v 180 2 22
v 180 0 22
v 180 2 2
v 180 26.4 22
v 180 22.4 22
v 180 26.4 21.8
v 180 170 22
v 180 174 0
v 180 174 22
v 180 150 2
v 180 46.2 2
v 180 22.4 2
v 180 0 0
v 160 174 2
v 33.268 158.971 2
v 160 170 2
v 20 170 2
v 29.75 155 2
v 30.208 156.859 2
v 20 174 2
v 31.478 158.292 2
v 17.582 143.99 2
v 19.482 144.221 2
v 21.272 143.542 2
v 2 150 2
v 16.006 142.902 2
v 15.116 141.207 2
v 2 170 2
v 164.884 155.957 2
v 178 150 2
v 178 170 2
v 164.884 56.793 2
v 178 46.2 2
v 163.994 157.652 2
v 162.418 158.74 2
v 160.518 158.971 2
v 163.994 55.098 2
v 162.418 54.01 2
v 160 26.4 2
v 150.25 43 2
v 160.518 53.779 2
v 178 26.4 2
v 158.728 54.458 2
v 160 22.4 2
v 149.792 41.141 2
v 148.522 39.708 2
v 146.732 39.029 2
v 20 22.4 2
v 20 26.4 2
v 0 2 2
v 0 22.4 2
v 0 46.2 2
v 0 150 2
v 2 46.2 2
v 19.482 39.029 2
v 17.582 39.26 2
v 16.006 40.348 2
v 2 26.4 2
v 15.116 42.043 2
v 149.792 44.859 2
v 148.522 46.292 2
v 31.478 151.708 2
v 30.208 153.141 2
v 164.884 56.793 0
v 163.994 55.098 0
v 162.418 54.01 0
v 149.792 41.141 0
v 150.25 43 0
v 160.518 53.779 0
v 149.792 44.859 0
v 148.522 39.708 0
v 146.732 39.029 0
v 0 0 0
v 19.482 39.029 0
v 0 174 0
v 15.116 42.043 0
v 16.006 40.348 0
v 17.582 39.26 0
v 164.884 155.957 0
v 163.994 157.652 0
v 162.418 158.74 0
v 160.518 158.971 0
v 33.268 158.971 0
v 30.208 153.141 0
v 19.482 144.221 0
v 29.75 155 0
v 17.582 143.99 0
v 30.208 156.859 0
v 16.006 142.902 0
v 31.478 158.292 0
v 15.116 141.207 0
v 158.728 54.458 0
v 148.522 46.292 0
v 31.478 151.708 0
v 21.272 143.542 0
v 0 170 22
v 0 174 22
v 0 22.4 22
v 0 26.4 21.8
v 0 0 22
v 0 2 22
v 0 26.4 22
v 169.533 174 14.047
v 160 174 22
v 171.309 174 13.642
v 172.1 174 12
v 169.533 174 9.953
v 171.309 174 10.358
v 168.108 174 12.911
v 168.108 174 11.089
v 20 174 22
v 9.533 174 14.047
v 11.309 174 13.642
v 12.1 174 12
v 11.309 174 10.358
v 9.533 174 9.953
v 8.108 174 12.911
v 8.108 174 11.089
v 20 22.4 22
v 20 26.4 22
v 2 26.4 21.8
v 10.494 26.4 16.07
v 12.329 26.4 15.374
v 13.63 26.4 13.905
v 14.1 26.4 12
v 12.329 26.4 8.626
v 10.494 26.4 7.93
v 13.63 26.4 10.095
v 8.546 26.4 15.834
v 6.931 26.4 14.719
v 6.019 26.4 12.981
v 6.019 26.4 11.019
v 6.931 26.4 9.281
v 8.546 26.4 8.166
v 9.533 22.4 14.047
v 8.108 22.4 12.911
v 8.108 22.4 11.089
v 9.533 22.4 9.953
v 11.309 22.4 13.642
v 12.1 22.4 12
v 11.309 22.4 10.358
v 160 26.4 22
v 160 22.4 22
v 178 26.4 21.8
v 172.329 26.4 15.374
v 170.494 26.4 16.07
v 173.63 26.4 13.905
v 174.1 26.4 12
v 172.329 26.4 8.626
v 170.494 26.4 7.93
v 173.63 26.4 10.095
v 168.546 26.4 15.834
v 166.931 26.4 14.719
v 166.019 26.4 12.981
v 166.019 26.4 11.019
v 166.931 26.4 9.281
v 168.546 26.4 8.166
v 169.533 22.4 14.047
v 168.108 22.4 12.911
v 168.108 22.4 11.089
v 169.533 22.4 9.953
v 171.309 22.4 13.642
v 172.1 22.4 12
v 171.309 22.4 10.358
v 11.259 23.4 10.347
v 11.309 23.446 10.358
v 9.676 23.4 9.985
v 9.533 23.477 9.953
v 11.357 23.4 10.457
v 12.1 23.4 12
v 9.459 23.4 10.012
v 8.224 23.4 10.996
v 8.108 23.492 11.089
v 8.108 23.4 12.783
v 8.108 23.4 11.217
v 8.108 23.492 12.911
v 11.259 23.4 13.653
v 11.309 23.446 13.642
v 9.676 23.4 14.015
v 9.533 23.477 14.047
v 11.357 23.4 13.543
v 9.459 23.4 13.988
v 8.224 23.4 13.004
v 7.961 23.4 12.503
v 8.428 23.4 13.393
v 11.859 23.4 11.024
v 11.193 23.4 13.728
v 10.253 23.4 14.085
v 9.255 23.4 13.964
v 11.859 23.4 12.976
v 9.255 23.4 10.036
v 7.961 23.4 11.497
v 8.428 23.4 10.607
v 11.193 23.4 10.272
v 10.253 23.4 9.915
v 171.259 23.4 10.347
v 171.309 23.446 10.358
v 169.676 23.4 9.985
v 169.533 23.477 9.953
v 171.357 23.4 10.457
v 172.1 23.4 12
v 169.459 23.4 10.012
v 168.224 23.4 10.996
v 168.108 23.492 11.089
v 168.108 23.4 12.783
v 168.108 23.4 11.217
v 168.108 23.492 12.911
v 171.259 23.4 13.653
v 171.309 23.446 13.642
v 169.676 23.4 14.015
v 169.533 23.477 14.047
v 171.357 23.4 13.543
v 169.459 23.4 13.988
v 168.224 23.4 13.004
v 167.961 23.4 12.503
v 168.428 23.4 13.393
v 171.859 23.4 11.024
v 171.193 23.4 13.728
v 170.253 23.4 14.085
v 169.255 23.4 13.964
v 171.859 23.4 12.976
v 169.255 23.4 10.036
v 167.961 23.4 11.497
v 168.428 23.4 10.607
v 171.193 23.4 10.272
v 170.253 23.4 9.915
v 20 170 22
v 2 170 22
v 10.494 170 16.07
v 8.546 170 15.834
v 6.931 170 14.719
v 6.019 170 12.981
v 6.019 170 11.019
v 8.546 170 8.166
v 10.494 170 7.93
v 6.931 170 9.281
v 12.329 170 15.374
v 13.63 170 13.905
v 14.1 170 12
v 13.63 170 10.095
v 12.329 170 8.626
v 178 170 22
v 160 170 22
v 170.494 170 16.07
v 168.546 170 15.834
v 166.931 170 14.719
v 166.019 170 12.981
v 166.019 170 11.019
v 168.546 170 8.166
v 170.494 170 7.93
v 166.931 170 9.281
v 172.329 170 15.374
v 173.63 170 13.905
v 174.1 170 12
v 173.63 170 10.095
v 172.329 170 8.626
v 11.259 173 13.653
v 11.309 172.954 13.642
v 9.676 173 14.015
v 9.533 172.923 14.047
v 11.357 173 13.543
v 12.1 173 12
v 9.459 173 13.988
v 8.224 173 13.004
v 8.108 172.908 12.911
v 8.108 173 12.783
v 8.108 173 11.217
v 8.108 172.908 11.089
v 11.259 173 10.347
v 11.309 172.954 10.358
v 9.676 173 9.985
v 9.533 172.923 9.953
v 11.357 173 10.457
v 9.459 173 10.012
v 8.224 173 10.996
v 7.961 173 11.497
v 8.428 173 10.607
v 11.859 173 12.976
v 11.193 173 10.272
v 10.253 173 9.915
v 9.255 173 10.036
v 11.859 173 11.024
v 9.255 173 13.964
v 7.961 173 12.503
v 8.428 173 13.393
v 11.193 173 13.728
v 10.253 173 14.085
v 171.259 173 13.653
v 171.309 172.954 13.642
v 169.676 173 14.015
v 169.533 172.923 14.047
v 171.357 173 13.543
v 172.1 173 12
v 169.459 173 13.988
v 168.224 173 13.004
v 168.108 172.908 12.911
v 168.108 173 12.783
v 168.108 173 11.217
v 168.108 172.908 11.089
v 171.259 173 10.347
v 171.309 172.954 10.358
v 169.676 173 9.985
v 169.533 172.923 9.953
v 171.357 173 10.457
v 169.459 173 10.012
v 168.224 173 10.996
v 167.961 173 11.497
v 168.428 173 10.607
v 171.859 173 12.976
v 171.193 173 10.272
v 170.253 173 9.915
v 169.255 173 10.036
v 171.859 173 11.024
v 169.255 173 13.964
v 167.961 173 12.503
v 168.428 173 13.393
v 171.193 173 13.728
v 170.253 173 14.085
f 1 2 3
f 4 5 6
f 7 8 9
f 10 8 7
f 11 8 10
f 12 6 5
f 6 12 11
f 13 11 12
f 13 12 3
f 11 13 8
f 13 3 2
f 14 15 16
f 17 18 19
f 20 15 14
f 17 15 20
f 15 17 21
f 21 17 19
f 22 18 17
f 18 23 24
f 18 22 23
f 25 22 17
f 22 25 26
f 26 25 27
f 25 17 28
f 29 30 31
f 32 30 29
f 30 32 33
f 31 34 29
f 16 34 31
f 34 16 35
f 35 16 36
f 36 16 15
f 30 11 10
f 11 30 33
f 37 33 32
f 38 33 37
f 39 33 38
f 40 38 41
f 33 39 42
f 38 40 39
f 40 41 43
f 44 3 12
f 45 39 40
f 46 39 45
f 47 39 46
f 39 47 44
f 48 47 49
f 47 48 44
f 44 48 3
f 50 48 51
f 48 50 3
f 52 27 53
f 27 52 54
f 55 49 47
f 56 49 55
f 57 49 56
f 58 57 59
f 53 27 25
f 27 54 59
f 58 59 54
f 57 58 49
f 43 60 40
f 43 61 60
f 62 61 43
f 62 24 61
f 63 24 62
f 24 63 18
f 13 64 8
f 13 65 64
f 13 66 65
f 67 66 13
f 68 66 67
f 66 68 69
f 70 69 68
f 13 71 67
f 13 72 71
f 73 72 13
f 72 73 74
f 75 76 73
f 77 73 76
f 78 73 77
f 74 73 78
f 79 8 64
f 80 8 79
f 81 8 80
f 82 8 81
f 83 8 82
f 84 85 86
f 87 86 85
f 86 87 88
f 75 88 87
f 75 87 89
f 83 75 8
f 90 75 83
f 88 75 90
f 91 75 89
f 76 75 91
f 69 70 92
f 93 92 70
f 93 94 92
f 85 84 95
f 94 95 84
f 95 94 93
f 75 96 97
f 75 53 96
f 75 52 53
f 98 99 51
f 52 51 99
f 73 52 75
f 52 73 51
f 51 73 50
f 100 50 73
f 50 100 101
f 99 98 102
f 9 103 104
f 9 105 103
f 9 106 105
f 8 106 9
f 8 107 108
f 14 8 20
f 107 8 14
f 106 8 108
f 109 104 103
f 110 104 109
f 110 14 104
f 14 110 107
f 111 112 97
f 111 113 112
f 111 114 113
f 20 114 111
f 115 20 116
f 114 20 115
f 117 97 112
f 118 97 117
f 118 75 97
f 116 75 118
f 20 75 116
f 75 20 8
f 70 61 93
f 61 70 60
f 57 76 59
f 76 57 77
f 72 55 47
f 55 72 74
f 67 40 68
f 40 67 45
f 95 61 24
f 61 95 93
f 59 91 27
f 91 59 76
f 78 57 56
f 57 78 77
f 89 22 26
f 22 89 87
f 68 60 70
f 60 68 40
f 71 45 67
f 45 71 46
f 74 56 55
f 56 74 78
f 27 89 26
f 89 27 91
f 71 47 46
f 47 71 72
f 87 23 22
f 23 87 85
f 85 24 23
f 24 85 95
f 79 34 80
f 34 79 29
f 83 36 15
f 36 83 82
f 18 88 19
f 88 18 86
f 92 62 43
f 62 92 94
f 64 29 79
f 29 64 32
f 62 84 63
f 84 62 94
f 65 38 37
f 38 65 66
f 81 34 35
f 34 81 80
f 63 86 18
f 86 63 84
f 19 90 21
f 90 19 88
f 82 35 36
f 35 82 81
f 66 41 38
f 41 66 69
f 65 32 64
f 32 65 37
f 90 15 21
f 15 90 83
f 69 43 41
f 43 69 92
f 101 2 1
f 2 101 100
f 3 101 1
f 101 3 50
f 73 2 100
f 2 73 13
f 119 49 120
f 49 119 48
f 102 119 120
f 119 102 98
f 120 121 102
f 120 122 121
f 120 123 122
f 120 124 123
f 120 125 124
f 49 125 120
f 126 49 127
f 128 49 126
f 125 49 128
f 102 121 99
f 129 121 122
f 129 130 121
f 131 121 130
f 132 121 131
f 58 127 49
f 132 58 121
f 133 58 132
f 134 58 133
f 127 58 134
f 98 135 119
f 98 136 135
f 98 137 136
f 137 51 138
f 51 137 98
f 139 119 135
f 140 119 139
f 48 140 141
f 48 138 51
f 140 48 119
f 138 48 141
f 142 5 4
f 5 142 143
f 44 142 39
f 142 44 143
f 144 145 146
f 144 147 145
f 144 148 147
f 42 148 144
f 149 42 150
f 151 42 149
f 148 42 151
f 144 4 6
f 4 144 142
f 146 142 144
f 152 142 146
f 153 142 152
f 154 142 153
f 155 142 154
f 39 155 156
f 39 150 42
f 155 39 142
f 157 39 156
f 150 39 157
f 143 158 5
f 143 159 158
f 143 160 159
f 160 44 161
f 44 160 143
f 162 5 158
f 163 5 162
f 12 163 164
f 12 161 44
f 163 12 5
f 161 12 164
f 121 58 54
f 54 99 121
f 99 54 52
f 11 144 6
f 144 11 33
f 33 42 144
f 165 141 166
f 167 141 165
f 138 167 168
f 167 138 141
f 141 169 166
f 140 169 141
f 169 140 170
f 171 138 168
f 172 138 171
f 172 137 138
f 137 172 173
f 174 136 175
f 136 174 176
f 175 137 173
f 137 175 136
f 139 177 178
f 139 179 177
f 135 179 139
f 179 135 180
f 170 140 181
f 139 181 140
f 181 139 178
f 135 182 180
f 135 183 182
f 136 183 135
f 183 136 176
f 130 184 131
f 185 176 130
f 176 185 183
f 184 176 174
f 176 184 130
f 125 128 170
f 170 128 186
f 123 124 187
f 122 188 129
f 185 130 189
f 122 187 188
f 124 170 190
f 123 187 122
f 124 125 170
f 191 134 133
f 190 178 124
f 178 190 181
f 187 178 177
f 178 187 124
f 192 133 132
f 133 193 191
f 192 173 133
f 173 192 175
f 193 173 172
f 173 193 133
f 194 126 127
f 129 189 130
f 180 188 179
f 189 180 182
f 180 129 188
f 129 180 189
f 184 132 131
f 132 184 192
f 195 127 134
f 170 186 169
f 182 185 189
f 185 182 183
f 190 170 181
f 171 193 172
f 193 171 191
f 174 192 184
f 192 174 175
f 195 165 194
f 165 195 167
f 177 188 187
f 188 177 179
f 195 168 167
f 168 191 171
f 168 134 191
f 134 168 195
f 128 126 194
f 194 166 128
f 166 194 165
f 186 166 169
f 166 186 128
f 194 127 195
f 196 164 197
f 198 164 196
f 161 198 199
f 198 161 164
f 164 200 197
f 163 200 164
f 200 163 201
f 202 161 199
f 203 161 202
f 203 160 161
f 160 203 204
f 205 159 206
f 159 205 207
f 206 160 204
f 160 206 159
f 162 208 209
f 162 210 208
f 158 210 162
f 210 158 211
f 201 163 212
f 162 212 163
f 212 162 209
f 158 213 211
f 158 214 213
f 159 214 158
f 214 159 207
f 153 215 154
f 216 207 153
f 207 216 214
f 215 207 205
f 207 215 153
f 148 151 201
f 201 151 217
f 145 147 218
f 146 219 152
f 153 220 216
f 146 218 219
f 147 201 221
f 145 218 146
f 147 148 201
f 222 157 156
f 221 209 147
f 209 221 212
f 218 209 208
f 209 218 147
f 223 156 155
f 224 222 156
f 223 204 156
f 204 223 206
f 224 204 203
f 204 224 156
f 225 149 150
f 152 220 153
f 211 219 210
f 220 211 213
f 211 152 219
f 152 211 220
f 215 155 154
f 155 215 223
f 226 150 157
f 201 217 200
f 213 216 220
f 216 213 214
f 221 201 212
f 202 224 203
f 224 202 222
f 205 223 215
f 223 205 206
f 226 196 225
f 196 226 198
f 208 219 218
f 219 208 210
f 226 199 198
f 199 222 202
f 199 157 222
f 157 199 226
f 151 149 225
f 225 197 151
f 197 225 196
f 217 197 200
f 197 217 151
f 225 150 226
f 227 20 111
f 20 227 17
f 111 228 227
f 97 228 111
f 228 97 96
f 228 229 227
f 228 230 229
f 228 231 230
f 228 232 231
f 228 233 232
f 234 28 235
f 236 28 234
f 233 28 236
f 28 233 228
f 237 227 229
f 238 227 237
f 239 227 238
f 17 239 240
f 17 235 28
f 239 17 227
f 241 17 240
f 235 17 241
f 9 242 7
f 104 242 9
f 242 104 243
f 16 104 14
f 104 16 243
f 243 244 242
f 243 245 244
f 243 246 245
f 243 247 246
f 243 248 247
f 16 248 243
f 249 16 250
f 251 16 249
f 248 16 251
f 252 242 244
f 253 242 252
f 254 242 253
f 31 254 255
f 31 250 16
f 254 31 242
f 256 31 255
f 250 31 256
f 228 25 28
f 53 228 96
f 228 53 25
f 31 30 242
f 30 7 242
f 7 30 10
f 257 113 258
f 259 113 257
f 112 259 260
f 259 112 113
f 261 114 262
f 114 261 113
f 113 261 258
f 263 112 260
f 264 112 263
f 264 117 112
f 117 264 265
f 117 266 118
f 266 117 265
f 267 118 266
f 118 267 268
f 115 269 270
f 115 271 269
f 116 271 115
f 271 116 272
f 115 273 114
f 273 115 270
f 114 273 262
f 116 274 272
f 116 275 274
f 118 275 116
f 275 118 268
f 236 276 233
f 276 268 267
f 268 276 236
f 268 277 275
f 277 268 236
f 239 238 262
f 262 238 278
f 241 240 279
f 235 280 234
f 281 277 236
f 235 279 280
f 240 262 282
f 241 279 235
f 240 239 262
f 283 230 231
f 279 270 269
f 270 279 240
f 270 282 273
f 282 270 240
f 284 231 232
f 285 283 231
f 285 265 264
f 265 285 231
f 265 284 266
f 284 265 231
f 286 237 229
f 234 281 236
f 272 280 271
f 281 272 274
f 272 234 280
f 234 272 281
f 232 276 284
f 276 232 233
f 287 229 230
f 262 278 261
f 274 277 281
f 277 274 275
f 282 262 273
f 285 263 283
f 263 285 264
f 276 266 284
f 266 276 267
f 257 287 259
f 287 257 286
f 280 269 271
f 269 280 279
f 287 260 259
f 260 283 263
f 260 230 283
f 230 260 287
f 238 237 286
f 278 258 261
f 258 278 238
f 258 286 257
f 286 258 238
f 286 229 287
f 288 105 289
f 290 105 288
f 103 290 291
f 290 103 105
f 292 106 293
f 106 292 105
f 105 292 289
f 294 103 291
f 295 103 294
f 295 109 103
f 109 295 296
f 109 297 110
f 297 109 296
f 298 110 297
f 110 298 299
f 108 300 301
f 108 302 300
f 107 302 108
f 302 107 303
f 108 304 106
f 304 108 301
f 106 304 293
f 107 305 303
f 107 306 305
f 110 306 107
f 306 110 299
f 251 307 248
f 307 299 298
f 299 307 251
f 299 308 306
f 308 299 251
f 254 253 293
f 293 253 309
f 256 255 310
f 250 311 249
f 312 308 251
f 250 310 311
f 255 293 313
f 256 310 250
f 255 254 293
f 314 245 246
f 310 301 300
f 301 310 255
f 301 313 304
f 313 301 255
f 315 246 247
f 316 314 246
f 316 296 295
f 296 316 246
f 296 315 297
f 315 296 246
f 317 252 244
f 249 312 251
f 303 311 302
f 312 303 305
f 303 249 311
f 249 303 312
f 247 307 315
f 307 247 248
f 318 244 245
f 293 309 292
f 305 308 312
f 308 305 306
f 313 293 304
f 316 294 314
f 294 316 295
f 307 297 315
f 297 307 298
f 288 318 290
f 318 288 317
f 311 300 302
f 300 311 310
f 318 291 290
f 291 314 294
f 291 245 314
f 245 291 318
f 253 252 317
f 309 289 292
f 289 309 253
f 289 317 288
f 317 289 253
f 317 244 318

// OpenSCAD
e=0.2;
baseThickness = 2;
h = 150;
w = 180;
crossW = 15;
cornerR=4;
shelveH=20;
shelveRailH=20;
holeD=4;
screwHeadD=8;
counterSunkH=3;

module triangle(x,y,h) {
	linear_extrude(height = h) polygon(points=[[0,0],[x,0],[0,y],[0,0]]);
}

module roundedTriangle(x,y,h,r) {
	translate([r,r,0]) minkowski() {
		triangle(x-r,y-r,h-1);
		cylinder(r=r,h=1);
	}
}

module side() {
	difference() {
		cube([w,h,baseThickness]);
		translate([crossW,crossW,0]) roundedTriangle(w-3.25*crossW,h-3.25*crossW,baseThickness+1,cornerR);
		translate([w-crossW,h-crossW,0]) rotate([0,0,180]) roundedTriangle(w-3.25*crossW,h-3.25*crossW,baseThickness+1,cornerR);
	}
}

module shelveRail() {
	difference() {
		union() {
		cube([w,baseThickness,shelveRailH+baseThickness]);
		cube([w,shelveH+2*baseThickness+2*e,baseThickness]);
		translate([0,shelveH+baseThickness+2*e,0]) cube([shelveH,2*baseThickness,shelveRailH+baseThickness]);
		translate([w-shelveH,shelveH+baseThickness+2*e,0]) cube([shelveH,2*baseThickness,shelveRailH+baseThickness]);
		translate([baseThickness,shelveH+3*baseThickness+2*e,baseThickness-e]) rotate([0,-90,0]) triangle(shelveH,shelveH,baseThickness);
		translate([w,shelveH+3*baseThickness+2*e,baseThickness-e]) rotate([0,-90,0]) triangle(shelveH,shelveH,baseThickness);
	}
	translate([shelveRailH/2,shelveH+baseThickness+2*e,shelveRailH/2+baseThickness]) rotate([-90,0,0]) hole();
	translate([w-shelveRailH/2,shelveH+baseThickness+2*e,shelveRailH/2+baseThickness]) rotate([-90,0,0]) hole();
   }
}

module top() {
	difference() {
		union() {
		cube([shelveH,2*baseThickness,shelveRailH+baseThickness]);
		translate([w-shelveH,0,0]) cube([shelveH,2*baseThickness,shelveRailH+baseThickness]);
		translate([0,0,baseThickness]) rotate([90,-90,90]) triangle(shelveH,shelveH,baseThickness);
		translate([w-baseThickness,0,baseThickness]) rotate([90,-90,90]) triangle(shelveH,shelveH,baseThickness);
	}
	#translate([shelveRailH/2,counterSunkH+baseThickness/2,shelveRailH/2+baseThickness]) rotate([90,0,0]) hole();
	#translate([w-shelveRailH/2,counterSunkH+baseThickness/2,shelveRailH/2+baseThickness]) rotate([90,0,0]) hole();
   }
}

module hole() {
	translate([0,0,-1]) cylinder(d=holeD+e,h=baseThickness+1);
	translate([0,0,2*baseThickness-counterSunkH]) cylinder(d1=holeD+e, d2 = screwHeadD+e, h=counterSunkH);
	translate([0,0,2*baseThickness]) cylinder(d = screwHeadD+e, h=1);
}

translate([0,shelveH+2*baseThickness,0]) side();
shelveRail();
translate([0,h+shelveH,0]) top();
